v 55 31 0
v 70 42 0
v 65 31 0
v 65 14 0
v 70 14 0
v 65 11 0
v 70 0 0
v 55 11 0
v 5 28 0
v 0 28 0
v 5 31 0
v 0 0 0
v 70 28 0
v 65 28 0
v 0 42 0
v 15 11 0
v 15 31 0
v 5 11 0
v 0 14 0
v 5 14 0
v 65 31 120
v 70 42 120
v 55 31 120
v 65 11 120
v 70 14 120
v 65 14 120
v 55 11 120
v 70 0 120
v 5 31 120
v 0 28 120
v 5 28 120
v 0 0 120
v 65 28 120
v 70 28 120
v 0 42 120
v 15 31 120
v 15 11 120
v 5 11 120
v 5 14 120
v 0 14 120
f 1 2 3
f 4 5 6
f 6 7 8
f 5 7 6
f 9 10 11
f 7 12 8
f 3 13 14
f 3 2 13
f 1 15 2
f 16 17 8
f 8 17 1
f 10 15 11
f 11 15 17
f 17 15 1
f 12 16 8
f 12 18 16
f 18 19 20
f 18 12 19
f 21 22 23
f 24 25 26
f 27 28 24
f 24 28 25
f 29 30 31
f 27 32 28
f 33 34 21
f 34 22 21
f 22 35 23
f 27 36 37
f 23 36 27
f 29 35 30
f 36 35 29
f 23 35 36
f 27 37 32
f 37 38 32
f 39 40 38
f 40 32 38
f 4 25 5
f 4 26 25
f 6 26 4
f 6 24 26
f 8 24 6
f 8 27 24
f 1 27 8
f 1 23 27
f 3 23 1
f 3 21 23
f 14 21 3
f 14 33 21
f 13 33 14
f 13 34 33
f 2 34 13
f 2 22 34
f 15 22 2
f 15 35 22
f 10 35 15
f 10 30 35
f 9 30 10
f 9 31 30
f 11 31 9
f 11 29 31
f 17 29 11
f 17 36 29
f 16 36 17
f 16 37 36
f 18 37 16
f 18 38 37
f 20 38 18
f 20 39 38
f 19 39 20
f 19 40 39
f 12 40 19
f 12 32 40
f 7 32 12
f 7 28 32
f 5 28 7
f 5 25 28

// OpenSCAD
$fn = 32;

// ----------------------------------------------------------------------
// T-slot rail: 70 x 42 mm section, 120 mm long
// ----------------------------------------------------------------------

// --- parameters (mm) ---
profile_height = 120;     // extrusion height
profile_points = 20;      // points of the closed outline

profile = [[0, 0], [70, 0], [70, 14], [65, 14], [65, 11], [55, 11], [55, 31], [65, 31], [65, 28], [70, 28], [70, 42], [0, 42], [0, 28], [5, 28], [5, 31], [15, 31], [15, 11], [5, 11], [5, 14], [0, 14]];  // single closed polygon, 20 points, counter clockwise

// --- the one profile operation ---
linear_extrude(height = profile_height) polygon(points = profile);
